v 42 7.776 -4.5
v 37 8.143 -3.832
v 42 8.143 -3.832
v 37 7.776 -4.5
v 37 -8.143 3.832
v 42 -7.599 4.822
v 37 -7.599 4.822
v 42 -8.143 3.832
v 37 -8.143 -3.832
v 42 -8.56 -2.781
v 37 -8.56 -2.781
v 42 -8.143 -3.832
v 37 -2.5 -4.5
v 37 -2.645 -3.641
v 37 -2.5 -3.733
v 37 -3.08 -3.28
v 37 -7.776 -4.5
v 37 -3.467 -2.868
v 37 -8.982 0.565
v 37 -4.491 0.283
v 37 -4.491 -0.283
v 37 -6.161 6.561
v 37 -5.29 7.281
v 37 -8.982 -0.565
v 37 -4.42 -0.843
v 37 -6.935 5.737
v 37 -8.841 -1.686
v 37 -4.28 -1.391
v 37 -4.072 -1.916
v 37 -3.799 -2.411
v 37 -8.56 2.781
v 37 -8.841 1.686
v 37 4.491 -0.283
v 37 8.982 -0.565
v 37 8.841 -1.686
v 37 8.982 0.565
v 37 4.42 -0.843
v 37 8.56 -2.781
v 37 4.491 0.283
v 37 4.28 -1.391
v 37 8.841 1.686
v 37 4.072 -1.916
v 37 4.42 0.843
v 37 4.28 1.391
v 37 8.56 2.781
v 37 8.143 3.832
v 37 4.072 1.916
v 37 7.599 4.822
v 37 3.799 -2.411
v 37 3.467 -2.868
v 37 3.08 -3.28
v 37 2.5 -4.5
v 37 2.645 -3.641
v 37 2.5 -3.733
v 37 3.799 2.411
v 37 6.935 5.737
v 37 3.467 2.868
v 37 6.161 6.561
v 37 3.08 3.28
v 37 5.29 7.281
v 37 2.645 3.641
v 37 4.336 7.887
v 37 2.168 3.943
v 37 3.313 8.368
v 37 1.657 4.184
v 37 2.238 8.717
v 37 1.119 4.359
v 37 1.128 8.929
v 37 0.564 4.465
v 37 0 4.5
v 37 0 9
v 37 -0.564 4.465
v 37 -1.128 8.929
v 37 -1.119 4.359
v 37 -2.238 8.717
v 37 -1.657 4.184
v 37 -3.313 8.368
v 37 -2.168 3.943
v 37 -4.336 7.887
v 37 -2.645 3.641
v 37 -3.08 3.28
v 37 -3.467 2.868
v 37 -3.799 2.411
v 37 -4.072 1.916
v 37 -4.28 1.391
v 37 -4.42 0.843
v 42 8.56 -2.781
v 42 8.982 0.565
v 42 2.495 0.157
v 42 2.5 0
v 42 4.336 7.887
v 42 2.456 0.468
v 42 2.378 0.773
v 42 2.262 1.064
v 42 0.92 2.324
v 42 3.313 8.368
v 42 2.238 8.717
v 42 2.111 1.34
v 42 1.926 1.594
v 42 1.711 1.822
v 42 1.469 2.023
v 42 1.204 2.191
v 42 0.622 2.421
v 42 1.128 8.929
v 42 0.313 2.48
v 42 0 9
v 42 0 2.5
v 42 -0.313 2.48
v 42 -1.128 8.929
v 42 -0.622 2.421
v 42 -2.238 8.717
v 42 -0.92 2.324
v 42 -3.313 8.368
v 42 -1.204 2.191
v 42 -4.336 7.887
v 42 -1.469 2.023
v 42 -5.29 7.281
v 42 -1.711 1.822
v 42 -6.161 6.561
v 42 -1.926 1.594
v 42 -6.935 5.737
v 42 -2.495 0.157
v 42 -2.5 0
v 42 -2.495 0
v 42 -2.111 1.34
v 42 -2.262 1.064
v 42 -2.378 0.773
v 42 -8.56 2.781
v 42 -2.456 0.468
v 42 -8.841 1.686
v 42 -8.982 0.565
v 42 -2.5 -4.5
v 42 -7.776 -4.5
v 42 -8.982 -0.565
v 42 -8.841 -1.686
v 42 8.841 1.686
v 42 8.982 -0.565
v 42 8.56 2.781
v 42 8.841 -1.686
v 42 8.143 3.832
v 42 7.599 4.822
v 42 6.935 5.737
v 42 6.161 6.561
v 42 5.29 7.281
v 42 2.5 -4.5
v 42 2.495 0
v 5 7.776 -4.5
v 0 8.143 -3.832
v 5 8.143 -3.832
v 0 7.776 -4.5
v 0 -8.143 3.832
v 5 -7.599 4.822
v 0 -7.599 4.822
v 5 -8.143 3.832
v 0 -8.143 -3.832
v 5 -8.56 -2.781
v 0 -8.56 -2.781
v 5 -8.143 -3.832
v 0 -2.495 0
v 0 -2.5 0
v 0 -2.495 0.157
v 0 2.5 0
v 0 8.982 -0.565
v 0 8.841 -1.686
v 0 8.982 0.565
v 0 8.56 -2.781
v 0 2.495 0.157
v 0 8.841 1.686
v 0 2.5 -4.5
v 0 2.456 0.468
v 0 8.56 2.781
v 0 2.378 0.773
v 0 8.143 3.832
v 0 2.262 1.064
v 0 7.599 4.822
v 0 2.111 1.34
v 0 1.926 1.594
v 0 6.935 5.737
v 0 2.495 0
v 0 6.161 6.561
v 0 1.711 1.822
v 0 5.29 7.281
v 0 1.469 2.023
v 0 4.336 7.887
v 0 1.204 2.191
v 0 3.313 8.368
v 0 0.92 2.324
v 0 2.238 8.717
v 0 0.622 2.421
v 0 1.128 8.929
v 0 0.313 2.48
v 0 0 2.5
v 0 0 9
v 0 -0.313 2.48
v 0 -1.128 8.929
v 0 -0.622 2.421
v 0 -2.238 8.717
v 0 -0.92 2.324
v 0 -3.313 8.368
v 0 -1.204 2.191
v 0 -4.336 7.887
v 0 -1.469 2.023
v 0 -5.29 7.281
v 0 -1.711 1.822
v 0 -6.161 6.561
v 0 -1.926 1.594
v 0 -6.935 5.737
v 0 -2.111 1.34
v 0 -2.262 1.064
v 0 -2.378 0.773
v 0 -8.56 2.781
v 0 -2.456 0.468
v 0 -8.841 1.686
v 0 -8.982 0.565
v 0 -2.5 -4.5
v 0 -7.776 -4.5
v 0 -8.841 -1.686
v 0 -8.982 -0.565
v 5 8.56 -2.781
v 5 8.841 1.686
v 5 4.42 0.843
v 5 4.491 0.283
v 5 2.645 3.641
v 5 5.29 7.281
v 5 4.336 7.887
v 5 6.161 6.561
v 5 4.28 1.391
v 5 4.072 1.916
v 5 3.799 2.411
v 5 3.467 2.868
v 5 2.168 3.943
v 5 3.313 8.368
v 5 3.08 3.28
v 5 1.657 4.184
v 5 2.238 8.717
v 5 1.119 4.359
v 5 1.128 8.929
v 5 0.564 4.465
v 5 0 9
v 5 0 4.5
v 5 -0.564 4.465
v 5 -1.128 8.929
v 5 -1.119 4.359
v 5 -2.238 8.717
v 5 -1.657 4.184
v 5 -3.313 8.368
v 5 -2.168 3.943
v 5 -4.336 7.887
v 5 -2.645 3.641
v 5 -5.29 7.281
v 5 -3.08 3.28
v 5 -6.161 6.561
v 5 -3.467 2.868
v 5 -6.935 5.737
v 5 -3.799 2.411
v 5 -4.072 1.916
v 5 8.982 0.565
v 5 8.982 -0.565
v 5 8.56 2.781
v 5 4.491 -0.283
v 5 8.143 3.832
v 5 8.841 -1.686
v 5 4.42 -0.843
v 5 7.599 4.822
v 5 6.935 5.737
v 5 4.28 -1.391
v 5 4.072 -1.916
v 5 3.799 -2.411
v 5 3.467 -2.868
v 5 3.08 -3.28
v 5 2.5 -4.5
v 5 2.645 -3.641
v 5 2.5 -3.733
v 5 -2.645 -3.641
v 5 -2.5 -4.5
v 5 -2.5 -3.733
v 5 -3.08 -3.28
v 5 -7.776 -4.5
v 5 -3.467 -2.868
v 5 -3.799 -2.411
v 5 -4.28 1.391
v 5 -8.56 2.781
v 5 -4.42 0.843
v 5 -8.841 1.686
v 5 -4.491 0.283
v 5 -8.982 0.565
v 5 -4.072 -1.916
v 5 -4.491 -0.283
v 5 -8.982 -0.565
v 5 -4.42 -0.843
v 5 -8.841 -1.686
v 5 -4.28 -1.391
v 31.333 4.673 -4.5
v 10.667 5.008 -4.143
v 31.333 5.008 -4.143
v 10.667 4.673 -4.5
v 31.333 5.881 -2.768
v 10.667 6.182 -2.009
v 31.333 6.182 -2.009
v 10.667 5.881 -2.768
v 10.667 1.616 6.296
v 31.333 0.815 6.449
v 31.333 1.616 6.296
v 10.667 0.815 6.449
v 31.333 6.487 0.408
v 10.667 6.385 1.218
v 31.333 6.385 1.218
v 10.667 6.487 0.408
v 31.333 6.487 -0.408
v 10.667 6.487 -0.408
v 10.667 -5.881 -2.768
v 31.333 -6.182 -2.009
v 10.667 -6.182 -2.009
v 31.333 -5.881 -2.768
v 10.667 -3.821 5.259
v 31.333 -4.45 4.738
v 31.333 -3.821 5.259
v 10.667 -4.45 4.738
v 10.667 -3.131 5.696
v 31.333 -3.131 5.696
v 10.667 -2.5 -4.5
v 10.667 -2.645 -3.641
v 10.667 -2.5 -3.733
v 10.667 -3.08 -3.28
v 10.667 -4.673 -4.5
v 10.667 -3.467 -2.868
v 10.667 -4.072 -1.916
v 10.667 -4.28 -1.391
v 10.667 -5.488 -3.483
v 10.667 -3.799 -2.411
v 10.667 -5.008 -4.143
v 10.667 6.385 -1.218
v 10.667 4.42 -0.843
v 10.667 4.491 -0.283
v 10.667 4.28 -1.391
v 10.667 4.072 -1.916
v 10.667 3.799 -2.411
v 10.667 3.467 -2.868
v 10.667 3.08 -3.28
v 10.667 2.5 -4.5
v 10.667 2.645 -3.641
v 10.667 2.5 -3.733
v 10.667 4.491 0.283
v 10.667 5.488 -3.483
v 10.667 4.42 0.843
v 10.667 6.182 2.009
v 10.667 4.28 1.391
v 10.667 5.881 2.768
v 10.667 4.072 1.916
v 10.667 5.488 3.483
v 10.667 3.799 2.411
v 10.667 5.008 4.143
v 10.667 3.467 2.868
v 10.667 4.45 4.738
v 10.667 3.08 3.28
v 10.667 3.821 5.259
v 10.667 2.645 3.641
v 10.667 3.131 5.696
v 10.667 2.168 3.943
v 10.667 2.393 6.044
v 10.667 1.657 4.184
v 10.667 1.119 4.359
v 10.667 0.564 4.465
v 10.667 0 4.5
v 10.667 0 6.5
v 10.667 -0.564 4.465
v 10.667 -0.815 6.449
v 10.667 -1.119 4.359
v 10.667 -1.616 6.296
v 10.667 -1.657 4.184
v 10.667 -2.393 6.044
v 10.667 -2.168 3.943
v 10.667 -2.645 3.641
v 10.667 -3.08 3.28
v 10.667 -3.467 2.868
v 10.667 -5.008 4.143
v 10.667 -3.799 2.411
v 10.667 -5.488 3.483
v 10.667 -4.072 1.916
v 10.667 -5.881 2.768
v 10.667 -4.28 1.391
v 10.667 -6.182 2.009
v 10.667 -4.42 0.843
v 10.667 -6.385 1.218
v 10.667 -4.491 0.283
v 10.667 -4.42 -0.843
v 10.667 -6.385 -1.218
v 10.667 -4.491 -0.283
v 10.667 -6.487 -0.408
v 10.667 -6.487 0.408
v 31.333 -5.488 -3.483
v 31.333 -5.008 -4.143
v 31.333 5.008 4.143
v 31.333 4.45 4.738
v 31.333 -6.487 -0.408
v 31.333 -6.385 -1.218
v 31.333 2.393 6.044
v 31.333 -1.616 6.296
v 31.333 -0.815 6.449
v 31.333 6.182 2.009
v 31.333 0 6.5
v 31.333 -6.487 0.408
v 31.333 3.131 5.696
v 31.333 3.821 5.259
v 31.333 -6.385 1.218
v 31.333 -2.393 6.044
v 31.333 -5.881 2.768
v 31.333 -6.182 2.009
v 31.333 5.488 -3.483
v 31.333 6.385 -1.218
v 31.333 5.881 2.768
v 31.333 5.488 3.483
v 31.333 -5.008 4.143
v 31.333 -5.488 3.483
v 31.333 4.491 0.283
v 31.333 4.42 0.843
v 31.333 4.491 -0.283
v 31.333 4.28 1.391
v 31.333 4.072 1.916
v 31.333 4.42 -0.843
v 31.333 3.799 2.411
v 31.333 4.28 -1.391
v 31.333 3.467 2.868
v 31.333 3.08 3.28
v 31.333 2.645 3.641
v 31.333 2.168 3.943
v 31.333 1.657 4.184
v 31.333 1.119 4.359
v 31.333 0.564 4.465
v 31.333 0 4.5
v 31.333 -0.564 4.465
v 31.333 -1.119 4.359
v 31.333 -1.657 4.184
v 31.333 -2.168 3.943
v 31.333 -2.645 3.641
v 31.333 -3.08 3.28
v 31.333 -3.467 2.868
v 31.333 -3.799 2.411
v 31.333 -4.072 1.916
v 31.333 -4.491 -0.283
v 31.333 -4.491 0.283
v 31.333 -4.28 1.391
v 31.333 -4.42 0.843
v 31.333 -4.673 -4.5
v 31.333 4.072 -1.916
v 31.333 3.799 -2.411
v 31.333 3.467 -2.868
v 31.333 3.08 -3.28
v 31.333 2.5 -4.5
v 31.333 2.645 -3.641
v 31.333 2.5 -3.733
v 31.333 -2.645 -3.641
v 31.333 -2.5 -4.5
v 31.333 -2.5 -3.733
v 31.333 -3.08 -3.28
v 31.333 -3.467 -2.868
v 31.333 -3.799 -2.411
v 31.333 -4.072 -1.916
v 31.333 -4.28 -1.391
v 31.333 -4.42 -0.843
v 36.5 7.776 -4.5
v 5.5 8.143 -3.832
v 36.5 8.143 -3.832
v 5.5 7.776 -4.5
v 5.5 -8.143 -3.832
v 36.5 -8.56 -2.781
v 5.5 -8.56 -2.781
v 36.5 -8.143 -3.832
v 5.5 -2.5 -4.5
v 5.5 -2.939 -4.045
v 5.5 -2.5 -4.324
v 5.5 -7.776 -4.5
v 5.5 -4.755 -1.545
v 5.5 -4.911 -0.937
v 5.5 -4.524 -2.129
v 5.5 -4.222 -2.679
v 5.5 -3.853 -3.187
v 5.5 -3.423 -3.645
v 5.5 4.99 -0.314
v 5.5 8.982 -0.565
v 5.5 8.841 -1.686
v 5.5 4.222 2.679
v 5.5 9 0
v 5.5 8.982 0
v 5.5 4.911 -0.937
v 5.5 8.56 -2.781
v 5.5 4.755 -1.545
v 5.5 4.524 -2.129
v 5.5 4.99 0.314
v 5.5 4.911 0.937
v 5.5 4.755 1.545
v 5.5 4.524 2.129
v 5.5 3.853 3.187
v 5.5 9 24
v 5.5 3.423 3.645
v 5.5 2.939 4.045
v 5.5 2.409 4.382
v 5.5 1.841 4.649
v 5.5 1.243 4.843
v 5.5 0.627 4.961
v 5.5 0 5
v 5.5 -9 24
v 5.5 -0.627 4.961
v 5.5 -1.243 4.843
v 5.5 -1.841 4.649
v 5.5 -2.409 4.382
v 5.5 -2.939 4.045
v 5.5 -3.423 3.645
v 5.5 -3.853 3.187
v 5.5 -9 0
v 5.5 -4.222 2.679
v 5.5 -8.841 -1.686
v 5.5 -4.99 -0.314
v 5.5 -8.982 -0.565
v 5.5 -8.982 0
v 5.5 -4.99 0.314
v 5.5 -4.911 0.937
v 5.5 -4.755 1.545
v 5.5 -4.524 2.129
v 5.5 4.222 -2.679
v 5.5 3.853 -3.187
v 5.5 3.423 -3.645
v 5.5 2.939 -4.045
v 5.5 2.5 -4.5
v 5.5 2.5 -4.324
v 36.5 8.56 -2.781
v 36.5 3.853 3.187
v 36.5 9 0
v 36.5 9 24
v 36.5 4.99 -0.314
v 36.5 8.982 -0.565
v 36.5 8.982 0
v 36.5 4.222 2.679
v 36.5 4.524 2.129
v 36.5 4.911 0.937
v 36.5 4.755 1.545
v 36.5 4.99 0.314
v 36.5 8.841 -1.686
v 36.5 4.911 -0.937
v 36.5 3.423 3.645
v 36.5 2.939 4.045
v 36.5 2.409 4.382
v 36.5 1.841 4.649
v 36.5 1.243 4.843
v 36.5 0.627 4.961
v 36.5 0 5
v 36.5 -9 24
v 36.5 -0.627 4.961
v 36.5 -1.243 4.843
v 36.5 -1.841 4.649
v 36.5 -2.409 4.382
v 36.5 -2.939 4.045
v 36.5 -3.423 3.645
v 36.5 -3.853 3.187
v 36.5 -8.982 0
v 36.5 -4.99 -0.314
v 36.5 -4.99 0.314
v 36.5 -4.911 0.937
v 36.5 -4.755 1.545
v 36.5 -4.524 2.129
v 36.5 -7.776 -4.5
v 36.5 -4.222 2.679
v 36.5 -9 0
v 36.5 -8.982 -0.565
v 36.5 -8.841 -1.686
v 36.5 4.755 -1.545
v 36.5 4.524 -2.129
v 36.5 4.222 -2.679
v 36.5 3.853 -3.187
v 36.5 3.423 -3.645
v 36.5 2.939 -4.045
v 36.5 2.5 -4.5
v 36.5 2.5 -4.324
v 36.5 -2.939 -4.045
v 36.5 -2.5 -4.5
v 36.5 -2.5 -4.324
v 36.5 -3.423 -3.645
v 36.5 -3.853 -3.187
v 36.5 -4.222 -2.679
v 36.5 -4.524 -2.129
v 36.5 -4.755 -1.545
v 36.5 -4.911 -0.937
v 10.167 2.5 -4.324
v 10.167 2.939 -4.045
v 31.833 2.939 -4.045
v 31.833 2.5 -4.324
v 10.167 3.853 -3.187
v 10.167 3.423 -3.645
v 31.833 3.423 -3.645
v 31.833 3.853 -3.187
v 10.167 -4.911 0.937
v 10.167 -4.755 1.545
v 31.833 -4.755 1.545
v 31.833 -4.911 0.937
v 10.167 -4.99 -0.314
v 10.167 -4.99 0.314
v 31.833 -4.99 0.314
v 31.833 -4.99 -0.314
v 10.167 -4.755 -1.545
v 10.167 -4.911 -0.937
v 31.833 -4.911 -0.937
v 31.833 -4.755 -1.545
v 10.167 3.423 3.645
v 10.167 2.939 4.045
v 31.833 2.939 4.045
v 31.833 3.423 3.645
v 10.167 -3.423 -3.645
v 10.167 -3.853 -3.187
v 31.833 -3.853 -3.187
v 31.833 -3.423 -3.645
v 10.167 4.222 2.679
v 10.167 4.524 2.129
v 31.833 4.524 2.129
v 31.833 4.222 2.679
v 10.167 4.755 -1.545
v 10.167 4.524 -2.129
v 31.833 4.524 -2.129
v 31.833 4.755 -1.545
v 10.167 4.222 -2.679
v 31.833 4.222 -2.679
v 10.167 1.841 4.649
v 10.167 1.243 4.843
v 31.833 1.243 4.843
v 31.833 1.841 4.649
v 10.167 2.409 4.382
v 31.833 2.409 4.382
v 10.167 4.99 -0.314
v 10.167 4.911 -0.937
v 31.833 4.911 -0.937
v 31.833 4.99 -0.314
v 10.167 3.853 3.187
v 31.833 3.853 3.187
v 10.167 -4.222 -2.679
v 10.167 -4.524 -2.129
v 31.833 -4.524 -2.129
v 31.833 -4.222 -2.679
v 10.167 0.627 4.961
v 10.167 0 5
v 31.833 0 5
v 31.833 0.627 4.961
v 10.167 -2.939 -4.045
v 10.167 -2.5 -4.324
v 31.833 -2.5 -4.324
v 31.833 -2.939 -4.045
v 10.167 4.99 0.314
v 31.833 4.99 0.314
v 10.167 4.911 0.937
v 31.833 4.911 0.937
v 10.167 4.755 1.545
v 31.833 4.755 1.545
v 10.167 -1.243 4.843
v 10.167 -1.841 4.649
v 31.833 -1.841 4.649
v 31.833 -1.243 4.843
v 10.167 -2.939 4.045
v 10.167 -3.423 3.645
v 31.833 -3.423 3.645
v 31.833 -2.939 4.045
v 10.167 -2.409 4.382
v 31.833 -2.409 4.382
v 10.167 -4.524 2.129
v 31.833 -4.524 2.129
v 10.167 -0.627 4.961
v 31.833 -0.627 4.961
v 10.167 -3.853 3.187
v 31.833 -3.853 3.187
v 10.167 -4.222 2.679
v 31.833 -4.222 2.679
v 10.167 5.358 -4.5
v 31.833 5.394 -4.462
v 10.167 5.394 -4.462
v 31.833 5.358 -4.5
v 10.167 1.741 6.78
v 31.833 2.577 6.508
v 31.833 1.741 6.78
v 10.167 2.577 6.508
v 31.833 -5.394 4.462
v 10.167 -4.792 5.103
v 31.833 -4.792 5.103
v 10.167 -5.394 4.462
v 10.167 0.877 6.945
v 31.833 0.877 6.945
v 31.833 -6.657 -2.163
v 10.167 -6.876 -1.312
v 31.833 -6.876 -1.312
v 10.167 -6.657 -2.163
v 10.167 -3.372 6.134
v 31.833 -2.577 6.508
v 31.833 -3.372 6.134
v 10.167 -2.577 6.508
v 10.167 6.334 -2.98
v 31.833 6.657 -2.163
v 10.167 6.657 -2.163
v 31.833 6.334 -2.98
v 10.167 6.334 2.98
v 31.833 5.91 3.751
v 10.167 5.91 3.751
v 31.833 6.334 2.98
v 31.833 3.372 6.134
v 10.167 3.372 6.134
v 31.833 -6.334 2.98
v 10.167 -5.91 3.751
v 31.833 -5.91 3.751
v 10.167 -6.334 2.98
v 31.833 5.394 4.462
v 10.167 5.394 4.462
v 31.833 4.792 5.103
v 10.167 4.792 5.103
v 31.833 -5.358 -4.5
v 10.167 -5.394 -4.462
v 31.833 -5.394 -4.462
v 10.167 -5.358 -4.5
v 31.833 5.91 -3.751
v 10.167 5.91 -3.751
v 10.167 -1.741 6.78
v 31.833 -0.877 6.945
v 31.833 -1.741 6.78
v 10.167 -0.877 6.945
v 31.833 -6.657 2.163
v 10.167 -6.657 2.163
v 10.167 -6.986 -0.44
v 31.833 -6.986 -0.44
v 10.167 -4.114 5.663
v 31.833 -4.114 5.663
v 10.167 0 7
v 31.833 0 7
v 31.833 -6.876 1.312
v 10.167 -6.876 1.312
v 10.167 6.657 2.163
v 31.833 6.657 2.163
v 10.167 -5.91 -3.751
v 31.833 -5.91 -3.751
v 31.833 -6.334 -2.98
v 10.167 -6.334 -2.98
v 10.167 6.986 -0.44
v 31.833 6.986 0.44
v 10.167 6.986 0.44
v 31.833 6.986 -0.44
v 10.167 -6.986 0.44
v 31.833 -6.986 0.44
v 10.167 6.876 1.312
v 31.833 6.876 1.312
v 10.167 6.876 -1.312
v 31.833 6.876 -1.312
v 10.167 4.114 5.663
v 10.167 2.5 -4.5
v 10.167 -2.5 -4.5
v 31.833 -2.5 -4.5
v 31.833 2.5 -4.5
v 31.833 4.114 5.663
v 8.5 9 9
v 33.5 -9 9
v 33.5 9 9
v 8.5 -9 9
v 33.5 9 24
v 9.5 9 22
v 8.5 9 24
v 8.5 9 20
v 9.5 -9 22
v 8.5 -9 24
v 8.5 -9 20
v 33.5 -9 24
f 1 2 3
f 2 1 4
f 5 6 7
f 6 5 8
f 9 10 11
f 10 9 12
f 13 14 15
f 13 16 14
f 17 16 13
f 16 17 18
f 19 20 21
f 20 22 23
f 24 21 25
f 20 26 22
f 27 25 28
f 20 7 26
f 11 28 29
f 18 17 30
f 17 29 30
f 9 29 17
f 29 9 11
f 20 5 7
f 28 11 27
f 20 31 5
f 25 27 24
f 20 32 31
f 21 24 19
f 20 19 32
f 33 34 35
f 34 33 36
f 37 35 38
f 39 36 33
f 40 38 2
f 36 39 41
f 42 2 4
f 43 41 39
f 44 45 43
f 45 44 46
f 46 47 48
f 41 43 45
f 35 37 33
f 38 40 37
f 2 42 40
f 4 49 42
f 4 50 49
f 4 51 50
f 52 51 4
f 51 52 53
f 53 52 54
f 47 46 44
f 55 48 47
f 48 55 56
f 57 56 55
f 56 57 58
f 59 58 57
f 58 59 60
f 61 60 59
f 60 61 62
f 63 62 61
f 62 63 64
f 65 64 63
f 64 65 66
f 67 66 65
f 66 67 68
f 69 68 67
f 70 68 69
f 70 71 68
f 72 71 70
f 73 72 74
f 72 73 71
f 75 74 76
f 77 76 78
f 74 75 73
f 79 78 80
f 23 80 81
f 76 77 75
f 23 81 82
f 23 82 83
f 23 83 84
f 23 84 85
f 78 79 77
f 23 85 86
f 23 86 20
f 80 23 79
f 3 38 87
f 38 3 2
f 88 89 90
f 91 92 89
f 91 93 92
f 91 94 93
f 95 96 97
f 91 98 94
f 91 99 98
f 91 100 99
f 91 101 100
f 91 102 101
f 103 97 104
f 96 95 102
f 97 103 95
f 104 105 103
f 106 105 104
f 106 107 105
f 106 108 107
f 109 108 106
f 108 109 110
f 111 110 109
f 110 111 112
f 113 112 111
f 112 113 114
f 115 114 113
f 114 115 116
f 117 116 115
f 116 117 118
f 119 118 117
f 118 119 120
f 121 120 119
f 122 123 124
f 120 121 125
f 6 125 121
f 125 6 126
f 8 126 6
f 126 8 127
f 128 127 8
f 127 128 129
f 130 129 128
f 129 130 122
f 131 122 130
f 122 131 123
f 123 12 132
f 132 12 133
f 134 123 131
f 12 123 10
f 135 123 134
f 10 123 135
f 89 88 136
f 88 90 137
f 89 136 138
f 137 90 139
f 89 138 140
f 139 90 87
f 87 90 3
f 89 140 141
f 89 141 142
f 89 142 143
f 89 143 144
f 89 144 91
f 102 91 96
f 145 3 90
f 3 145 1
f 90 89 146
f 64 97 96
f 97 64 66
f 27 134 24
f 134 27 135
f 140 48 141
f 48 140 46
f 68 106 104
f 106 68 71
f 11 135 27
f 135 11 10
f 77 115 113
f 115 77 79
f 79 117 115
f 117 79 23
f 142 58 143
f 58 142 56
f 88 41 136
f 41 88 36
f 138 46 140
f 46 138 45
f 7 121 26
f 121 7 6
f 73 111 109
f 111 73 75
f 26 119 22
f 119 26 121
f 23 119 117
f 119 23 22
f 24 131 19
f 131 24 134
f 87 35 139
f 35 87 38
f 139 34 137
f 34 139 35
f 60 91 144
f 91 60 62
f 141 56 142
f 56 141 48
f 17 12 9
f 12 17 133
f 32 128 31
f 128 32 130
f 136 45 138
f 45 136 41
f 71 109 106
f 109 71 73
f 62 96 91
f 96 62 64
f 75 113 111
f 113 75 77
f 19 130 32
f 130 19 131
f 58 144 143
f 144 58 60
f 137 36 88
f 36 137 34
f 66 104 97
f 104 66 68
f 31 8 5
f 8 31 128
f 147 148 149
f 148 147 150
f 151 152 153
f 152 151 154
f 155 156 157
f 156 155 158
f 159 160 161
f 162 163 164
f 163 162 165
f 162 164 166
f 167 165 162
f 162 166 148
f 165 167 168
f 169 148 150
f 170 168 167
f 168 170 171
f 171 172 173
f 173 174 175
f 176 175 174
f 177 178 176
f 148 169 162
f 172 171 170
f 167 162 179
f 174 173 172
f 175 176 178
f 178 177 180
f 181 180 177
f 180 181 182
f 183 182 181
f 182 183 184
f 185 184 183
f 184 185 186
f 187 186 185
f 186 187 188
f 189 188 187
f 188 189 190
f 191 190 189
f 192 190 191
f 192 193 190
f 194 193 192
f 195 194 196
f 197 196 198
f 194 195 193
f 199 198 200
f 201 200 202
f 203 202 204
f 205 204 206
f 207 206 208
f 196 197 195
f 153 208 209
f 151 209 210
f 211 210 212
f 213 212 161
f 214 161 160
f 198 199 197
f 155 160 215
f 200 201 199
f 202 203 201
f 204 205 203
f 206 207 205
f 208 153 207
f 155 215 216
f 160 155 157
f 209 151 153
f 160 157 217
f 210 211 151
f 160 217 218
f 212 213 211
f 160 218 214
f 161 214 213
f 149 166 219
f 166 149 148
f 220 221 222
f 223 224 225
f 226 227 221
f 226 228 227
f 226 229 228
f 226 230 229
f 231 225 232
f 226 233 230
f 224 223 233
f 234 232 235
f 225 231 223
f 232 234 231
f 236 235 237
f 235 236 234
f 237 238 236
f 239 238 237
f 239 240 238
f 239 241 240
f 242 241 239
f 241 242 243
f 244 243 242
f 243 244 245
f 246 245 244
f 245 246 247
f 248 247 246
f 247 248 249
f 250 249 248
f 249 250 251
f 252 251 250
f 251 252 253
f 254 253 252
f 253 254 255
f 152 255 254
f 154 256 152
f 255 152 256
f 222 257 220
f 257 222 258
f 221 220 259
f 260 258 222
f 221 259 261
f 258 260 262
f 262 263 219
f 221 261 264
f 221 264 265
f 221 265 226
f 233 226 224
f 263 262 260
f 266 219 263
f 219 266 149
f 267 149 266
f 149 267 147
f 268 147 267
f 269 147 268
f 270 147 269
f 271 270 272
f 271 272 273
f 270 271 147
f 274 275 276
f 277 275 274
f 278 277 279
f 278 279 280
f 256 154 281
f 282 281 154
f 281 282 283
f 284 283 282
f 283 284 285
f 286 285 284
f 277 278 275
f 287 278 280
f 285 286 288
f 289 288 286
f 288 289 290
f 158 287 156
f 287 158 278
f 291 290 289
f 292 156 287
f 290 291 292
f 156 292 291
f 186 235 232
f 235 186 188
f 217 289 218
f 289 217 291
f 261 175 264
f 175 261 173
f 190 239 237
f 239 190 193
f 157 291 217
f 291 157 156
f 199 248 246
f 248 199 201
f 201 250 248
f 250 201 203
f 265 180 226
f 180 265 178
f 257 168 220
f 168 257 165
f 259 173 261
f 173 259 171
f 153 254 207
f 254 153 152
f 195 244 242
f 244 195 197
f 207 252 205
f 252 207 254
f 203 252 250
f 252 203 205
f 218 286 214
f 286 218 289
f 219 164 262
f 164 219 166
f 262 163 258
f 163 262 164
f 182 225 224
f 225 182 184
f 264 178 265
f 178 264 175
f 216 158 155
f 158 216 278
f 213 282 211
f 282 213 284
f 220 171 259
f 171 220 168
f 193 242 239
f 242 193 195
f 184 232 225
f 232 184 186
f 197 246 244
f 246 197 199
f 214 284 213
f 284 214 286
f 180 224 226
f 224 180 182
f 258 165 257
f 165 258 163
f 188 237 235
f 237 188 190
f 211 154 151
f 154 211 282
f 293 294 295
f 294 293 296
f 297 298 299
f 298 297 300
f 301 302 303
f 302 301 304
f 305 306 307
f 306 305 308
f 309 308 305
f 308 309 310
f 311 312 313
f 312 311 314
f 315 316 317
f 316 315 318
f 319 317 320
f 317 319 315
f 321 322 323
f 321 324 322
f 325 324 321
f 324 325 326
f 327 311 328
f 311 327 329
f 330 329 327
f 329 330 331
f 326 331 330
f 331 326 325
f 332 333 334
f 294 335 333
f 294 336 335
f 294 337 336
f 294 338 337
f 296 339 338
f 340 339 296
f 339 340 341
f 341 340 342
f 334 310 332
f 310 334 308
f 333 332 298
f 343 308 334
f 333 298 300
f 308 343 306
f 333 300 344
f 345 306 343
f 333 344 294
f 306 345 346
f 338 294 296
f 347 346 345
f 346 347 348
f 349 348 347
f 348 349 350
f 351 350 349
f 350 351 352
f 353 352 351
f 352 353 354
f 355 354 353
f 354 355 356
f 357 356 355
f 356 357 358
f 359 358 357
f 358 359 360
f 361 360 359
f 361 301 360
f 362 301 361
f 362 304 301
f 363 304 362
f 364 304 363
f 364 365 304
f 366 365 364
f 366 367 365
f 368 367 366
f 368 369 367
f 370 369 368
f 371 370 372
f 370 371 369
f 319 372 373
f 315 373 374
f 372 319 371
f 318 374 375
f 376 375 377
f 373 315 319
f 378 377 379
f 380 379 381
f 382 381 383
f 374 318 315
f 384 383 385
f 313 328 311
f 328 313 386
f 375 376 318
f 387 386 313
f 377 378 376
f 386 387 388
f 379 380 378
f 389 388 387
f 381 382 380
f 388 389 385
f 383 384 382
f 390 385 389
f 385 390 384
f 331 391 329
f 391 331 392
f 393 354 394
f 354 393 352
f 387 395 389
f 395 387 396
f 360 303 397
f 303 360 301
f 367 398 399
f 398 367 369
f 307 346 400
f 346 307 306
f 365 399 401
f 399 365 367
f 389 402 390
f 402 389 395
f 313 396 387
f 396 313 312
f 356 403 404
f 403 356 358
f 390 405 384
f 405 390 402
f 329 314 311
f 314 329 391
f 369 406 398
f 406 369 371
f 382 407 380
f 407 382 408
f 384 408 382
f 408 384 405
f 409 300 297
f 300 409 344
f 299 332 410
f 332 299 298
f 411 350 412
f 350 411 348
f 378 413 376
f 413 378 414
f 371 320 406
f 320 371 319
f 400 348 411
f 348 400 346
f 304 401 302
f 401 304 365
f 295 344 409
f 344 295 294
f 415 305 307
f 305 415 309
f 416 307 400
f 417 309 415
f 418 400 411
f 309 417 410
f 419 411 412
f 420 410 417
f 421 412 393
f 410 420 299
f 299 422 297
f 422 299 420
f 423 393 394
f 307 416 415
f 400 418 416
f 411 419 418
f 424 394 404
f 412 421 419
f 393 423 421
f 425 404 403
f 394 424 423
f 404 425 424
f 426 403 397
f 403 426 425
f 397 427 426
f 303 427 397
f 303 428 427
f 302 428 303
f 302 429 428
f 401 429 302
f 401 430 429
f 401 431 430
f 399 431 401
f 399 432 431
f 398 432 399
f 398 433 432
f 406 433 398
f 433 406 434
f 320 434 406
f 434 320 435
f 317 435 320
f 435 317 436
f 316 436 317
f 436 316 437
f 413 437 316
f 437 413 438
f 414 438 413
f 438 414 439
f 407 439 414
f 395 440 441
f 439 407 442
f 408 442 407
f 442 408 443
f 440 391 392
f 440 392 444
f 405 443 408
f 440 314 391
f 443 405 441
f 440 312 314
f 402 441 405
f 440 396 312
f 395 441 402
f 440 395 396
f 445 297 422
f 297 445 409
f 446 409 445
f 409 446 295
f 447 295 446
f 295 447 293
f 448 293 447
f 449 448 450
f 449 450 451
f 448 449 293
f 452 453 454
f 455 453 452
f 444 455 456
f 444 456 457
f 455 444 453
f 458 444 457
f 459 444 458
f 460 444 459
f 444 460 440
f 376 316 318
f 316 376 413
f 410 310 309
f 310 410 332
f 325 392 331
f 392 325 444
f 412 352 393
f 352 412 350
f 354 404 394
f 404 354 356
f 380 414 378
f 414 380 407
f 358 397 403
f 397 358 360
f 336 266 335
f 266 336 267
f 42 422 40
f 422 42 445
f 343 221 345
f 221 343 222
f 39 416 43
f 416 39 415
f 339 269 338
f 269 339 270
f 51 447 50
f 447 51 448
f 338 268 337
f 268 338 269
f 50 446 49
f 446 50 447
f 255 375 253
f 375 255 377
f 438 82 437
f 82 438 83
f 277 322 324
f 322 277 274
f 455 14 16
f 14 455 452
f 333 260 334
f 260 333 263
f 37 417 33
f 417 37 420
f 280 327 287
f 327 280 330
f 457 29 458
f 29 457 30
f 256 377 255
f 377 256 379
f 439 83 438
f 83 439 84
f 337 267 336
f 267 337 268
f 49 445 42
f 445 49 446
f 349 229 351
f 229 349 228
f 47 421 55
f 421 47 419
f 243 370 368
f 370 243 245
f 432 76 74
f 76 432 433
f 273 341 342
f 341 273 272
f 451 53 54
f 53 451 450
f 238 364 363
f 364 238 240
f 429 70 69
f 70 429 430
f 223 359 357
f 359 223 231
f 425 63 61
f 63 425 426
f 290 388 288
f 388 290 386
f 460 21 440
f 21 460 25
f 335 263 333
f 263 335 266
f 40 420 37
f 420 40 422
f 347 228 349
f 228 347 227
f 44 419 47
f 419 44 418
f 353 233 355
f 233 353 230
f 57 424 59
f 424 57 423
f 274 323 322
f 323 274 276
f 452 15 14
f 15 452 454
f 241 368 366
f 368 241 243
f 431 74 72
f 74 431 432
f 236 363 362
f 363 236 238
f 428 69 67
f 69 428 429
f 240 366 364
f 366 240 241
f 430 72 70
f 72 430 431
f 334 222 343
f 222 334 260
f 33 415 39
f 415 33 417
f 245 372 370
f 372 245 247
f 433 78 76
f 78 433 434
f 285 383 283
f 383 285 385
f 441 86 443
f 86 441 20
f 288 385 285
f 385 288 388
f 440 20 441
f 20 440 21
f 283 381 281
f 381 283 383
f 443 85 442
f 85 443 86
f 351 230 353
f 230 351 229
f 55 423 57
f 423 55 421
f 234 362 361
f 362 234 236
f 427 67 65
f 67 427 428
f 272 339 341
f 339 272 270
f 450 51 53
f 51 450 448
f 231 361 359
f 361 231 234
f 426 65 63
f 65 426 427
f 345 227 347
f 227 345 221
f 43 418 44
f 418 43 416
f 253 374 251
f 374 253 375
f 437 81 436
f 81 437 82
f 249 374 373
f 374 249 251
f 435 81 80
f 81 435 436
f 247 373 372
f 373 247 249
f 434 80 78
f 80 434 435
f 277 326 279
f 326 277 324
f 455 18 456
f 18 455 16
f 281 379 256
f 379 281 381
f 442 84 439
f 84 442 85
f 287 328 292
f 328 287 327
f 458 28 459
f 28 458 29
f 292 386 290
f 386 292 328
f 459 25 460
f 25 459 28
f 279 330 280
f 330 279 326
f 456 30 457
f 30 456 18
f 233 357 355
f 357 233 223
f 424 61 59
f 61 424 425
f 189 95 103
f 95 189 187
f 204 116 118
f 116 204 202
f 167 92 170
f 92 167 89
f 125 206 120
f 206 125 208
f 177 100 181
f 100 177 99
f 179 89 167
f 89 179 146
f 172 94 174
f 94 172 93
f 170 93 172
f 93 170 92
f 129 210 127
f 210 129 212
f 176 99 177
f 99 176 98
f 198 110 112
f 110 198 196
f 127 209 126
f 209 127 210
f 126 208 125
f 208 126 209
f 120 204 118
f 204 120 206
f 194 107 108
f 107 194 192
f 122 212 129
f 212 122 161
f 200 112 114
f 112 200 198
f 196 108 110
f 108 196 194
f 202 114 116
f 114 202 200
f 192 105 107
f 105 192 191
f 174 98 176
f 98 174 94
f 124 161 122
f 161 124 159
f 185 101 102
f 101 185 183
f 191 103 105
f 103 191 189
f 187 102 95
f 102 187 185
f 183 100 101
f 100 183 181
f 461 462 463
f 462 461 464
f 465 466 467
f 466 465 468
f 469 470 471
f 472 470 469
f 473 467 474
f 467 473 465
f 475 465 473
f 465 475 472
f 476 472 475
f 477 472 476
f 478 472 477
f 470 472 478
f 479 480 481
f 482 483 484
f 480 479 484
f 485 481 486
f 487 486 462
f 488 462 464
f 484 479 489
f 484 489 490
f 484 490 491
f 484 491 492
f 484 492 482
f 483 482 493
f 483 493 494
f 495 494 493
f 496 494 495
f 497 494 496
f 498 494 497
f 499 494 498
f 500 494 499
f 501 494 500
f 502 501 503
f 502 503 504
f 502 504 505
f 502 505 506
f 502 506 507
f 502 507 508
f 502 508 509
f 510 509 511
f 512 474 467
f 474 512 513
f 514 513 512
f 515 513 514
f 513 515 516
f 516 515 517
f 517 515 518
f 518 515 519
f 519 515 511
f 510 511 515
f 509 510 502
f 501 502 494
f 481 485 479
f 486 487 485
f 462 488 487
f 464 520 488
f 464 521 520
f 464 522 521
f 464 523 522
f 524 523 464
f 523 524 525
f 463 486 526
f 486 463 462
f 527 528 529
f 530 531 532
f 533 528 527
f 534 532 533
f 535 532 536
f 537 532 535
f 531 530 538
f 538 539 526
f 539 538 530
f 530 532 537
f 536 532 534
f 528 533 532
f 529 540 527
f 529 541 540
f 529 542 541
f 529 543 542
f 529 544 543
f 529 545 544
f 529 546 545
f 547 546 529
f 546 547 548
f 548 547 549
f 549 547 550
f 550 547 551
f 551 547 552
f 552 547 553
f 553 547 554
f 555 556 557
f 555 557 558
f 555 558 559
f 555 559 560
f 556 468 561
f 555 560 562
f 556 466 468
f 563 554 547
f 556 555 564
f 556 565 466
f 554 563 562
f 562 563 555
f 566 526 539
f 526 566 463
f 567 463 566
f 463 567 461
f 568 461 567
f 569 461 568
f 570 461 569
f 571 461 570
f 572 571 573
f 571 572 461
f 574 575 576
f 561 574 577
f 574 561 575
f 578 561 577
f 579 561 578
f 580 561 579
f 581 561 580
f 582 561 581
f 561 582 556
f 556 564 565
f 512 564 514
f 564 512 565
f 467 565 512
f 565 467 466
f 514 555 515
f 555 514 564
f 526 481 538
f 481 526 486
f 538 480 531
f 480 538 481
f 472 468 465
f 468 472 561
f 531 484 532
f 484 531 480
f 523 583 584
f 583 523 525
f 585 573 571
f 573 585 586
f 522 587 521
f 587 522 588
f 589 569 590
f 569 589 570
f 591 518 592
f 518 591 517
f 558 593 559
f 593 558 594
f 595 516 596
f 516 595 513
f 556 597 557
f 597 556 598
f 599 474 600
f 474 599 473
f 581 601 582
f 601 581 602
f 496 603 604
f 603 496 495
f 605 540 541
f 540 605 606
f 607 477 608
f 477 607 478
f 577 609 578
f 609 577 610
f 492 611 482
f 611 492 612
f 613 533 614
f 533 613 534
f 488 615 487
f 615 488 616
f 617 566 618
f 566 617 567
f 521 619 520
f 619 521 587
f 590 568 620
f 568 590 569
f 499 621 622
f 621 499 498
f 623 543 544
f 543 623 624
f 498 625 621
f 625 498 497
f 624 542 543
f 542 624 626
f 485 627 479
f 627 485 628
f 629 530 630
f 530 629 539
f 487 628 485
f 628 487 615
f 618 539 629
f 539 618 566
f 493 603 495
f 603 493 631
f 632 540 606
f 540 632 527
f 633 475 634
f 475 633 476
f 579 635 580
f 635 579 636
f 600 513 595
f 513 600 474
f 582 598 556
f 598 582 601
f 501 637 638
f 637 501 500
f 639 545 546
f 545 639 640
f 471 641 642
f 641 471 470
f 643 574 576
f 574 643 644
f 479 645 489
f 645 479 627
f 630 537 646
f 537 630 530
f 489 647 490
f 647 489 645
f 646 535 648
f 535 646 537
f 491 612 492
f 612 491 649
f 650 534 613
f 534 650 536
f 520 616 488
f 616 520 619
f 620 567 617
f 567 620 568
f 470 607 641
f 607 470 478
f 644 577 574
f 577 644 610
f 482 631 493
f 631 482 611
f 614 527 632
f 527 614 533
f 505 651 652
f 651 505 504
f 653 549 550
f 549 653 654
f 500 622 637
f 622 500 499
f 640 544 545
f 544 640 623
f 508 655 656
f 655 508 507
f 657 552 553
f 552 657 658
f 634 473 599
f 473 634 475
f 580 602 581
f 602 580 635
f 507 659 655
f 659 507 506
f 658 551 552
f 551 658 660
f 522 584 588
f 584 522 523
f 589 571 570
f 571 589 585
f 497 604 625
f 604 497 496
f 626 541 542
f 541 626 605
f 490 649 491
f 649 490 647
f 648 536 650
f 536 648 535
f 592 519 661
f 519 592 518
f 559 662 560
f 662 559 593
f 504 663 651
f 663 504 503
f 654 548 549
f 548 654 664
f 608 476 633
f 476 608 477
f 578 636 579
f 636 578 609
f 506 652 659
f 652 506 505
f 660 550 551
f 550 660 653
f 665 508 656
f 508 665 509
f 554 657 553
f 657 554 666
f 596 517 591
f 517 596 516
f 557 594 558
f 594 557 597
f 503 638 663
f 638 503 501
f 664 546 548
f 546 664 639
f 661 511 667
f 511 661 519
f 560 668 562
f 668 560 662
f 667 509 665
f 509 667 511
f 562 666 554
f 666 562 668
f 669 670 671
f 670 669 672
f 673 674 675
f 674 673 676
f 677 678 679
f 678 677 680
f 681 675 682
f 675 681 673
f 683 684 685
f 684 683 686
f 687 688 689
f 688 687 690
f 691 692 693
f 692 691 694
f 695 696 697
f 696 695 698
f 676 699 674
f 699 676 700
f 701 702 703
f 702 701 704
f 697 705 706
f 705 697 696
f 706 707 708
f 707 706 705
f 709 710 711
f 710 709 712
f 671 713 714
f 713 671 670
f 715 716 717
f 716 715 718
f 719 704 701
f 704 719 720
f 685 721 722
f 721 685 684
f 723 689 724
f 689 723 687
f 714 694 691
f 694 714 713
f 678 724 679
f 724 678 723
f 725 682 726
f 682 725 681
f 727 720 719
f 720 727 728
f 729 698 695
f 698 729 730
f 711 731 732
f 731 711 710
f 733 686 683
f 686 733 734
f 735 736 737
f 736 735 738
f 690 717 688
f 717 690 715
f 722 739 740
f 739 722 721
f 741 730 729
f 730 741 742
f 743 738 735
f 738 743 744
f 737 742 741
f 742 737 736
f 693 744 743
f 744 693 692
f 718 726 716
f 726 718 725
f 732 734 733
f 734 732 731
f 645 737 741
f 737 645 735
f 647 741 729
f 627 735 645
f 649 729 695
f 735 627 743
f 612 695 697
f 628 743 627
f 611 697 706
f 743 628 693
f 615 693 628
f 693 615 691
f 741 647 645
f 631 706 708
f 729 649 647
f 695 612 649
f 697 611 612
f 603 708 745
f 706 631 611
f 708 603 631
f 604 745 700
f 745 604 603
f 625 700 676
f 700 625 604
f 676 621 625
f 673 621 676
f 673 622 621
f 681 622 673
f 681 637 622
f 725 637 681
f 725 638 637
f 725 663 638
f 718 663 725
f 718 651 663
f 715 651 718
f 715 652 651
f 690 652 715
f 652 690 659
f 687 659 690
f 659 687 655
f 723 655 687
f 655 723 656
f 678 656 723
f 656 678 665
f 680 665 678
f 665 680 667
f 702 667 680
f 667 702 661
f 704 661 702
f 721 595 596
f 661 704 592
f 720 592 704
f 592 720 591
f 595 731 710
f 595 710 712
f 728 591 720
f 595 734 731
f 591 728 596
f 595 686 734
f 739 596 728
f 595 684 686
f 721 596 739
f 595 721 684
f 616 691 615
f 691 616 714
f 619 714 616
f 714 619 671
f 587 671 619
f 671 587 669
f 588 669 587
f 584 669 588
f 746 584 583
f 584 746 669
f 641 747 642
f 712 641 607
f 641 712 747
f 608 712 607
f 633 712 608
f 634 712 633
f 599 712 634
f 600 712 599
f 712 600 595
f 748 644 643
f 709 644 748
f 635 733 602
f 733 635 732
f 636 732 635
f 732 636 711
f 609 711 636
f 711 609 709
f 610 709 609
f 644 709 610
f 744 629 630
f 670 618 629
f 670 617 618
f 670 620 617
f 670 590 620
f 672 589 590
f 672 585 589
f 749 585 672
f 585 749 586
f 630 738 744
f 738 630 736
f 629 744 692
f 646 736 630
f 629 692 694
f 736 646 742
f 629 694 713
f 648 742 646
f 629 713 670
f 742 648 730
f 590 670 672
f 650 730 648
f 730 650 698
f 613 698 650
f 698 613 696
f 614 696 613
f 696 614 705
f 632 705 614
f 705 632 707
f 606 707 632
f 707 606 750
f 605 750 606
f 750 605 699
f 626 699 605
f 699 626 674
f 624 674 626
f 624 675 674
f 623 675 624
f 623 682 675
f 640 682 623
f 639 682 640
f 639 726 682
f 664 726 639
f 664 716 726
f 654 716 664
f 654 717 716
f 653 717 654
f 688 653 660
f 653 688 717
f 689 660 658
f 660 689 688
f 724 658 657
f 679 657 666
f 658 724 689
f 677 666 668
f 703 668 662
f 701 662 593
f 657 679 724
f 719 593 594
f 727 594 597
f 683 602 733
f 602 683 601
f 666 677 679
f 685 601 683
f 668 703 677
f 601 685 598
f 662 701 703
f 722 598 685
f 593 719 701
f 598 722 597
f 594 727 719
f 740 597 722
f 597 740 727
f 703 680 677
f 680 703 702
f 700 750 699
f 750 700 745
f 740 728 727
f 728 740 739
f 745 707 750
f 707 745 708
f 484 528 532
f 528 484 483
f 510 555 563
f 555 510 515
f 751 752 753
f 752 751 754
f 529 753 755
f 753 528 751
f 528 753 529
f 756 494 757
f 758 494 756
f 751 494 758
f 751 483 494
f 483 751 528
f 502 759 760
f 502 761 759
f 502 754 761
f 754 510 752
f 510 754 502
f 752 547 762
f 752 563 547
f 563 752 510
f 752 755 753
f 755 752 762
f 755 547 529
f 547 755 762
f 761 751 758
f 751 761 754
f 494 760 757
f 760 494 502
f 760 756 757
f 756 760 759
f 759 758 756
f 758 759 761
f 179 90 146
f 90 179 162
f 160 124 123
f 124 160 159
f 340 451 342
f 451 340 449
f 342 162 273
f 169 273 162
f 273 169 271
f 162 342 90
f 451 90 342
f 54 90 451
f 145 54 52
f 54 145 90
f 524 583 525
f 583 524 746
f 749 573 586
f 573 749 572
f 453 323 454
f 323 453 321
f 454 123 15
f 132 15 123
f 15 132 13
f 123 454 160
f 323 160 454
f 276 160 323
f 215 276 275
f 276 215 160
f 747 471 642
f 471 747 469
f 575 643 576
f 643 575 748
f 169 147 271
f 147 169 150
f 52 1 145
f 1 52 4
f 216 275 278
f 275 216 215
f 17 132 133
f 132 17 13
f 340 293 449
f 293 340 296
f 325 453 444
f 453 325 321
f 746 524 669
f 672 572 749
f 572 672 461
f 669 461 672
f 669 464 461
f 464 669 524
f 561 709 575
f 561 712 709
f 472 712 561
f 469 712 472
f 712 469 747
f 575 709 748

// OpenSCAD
/* [PrintOptions] */
// preview[view:south east, tilt:bottom diagonal]

// splits the cable holder into 2 parts for printing if your machine doesn't do well with printing tight tolerances
show_seperate = "no"; // [yes, no]

/* [Basic] */
// is the diameter of the cable in mm to be held by the cable holder
cable_diameter = 5;
// sets the distance between the holding tabs in mm
table_thickness = 25;
// controls the distance between moving parts of the cable holder
tolerance = 0.5;


/* [Table_tabs] */
// adjusts the length of the tabs in mm that will hold the cable holder on to the table
tab_length = 15;
// adjusts how thick the tabs that hold the cable holder to the table should be in mm
tab_thickness = 3;

/* [Table_grip] */
// adjusts the triangular grip protrusion height in mm
grip_height = 1;
// adjusts the base width of the triangular grip protrusion in mm
grip_width = 4;

/* [Thumbwheels] */
//controls how tall the end thumbwheels should be in mm
thumbwheel_height = 5;

/* [Advanced] */
// is confusing name, just play with it and see what it does
retainer_factor = 6; // [3, 4, 5, 6, 7, 8, 9, 10]
// is another one to play around with.  Choose values between 0 and 2
plane_cut_factor = 1;
// is the quality of the cylinders
$fn = 50;

/* [Advanced_neck] */
// is the thickness of the inner rotating cuff in mm
neck_thickness = 2;

/* [Advanced_holder] */
// controls the overall thickness of the outer holder in mm
holder_thickness = 4;

/* [Hidden] */
barrel_lift_factor = 1/retainer_factor;
barrel_thickness = holder_thickness/2;

holder_height = 2*tab_thickness + table_thickness;
holder_diameter = cable_diameter + 2*neck_thickness + 2*tolerance + 2*holder_thickness;
plane_cut_depth = plane_cut_factor*(cable_diameter/2 + neck_thickness);

preview_tab = "";

rotate([0,90,0]) difference()
{

	// main holder barrels and tabs
	union()
	{
		// inner barrel
		
		if(show_seperate == "no")
		{
			InnerBarrel();
		}
		else
		{
			translate([0, holder_diameter + 5, 0]) 
			difference()
			{
				InnerBarrel();
				// cable notch
				translate([0, -cable_diameter/2, -0.5]) cube([holder_diameter/2 + 0.5, cable_diameter, thumbwheel_height + tolerance + holder_height + tolerance + thumbwheel_height + 1]);
				// plane slice
				translate([plane_cut_depth, -(holder_diameter + 1)/2, -0.5]) cube([holder_diameter/2 + 0.5, holder_diameter + 1, thumbwheel_height + tolerance + holder_height + tolerance + thumbwheel_height + 1]);
			}
		}
		
		// outer holder barrel
		highlight("Advanced_holder") difference()
		{
			// main body of the holder
			translate([0,0, thumbwheel_height + tolerance]) cylinder(r = holder_diameter/2, h = holder_height);
			
			// tolerance for neck
			translate([0,0,thumbwheel_height + tolerance + -0.5]) cylinder(r = cable_diameter/2 + neck_thickness + tolerance, h = holder_height + 1);
			// tolerance for the barrel
			translate([0,0, thumbwheel_height + tolerance + barrel_lift_factor*holder_height-tolerance]) cylinder(r = cable_diameter/2 + neck_thickness + barrel_thickness + tolerance, h = holder_height*(1-2*barrel_lift_factor) + 2*tolerance);
		}
		
		// main body holder
		union()
		{
			// upper tab
			highlight("Table_tabs") translate([-tab_length - holder_diameter/2, -holder_diameter/2, thumbwheel_height + tolerance + holder_height - tab_thickness]) cube([tab_length + 0.1, holder_diameter, tab_thickness]);
			// lower tab
			highlight("Table_tabs")translate([-tab_length - holder_diameter/2, -holder_diameter/2, thumbwheel_height + tolerance]) cube([tab_length + 0.1, holder_diameter, tab_thickness]);
			// lower grip
			highlight("Table_grip") translate([-tab_length - holder_diameter/2, holder_diameter/2,  thumbwheel_height + tolerance + tab_thickness]) rotate([90, 0, 0]) linear_extrude(height = holder_diameter, convexity = 10) polygon(points = [[0,0], [grip_width/2,grip_height], [grip_width,0], [grip_width,-0.1], [0,-0.1]]);
			
			// body block to  cylinder
			highlight("Advanced_holder") difference()
			{
				// main body block
				translate([-holder_diameter/2, -holder_diameter/2, thumbwheel_height + tolerance]) cube([holder_diameter/2, holder_diameter, holder_height]);
				// cylinder cut
				translate([0,0, thumbwheel_height + tolerance - 0.1]) cylinder(r = holder_diameter/2, h = holder_height + 1);
			}
		}
	}

	// cable notch
	translate([0, -cable_diameter/2, -0.5]) cube([holder_diameter/2 + 0.5, cable_diameter, thumbwheel_height + tolerance + holder_height + tolerance + thumbwheel_height + 1]);
	// plane slice
	translate([plane_cut_depth, -(holder_diameter + 1)/2, -0.5]) cube([holder_diameter/2 + 0.5, holder_diameter + 1, thumbwheel_height + tolerance + holder_height + tolerance + thumbwheel_height + 1]);
}

module InnerBarrel()
{
	difference()
		{
			union()
			{
				// top thumbwheel
				highlight("Thumbwheels") translate([0,0, thumbwheel_height + tolerance + holder_height+tolerance]) cylinder(r = holder_diameter/2, h = thumbwheel_height);
				// bottom thumbwheel
				highlight("Thumbwheels") cylinder(r = holder_diameter/2, h = thumbwheel_height);
				// retaining barrel
				translate([0,0, thumbwheel_height + tolerance + barrel_lift_factor*holder_height]) cylinder(r = cable_diameter/2 + neck_thickness + barrel_thickness, h = holder_height*(1-2*barrel_lift_factor));
				// the main barrel, or the "neck"
				highlight("Advanced_neck") cylinder(r = cable_diameter/2 + neck_thickness, h =thumbwheel_height + tolerance +  holder_height + tolerance + thumbwheel_height);
			}

			// The hole for the cable to go through
			translate([0,0,-.5]) cylinder(r = cable_diameter/2, h = thumbwheel_height + tolerance + holder_height + tolerance + thumbwheel_height + 1);
		}
}

module highlight(this_tab)
{
	if(preview_tab == this_tab)
	{
		color("red") children(0);
	}
	else
	{	
		children(0);
	}
}
